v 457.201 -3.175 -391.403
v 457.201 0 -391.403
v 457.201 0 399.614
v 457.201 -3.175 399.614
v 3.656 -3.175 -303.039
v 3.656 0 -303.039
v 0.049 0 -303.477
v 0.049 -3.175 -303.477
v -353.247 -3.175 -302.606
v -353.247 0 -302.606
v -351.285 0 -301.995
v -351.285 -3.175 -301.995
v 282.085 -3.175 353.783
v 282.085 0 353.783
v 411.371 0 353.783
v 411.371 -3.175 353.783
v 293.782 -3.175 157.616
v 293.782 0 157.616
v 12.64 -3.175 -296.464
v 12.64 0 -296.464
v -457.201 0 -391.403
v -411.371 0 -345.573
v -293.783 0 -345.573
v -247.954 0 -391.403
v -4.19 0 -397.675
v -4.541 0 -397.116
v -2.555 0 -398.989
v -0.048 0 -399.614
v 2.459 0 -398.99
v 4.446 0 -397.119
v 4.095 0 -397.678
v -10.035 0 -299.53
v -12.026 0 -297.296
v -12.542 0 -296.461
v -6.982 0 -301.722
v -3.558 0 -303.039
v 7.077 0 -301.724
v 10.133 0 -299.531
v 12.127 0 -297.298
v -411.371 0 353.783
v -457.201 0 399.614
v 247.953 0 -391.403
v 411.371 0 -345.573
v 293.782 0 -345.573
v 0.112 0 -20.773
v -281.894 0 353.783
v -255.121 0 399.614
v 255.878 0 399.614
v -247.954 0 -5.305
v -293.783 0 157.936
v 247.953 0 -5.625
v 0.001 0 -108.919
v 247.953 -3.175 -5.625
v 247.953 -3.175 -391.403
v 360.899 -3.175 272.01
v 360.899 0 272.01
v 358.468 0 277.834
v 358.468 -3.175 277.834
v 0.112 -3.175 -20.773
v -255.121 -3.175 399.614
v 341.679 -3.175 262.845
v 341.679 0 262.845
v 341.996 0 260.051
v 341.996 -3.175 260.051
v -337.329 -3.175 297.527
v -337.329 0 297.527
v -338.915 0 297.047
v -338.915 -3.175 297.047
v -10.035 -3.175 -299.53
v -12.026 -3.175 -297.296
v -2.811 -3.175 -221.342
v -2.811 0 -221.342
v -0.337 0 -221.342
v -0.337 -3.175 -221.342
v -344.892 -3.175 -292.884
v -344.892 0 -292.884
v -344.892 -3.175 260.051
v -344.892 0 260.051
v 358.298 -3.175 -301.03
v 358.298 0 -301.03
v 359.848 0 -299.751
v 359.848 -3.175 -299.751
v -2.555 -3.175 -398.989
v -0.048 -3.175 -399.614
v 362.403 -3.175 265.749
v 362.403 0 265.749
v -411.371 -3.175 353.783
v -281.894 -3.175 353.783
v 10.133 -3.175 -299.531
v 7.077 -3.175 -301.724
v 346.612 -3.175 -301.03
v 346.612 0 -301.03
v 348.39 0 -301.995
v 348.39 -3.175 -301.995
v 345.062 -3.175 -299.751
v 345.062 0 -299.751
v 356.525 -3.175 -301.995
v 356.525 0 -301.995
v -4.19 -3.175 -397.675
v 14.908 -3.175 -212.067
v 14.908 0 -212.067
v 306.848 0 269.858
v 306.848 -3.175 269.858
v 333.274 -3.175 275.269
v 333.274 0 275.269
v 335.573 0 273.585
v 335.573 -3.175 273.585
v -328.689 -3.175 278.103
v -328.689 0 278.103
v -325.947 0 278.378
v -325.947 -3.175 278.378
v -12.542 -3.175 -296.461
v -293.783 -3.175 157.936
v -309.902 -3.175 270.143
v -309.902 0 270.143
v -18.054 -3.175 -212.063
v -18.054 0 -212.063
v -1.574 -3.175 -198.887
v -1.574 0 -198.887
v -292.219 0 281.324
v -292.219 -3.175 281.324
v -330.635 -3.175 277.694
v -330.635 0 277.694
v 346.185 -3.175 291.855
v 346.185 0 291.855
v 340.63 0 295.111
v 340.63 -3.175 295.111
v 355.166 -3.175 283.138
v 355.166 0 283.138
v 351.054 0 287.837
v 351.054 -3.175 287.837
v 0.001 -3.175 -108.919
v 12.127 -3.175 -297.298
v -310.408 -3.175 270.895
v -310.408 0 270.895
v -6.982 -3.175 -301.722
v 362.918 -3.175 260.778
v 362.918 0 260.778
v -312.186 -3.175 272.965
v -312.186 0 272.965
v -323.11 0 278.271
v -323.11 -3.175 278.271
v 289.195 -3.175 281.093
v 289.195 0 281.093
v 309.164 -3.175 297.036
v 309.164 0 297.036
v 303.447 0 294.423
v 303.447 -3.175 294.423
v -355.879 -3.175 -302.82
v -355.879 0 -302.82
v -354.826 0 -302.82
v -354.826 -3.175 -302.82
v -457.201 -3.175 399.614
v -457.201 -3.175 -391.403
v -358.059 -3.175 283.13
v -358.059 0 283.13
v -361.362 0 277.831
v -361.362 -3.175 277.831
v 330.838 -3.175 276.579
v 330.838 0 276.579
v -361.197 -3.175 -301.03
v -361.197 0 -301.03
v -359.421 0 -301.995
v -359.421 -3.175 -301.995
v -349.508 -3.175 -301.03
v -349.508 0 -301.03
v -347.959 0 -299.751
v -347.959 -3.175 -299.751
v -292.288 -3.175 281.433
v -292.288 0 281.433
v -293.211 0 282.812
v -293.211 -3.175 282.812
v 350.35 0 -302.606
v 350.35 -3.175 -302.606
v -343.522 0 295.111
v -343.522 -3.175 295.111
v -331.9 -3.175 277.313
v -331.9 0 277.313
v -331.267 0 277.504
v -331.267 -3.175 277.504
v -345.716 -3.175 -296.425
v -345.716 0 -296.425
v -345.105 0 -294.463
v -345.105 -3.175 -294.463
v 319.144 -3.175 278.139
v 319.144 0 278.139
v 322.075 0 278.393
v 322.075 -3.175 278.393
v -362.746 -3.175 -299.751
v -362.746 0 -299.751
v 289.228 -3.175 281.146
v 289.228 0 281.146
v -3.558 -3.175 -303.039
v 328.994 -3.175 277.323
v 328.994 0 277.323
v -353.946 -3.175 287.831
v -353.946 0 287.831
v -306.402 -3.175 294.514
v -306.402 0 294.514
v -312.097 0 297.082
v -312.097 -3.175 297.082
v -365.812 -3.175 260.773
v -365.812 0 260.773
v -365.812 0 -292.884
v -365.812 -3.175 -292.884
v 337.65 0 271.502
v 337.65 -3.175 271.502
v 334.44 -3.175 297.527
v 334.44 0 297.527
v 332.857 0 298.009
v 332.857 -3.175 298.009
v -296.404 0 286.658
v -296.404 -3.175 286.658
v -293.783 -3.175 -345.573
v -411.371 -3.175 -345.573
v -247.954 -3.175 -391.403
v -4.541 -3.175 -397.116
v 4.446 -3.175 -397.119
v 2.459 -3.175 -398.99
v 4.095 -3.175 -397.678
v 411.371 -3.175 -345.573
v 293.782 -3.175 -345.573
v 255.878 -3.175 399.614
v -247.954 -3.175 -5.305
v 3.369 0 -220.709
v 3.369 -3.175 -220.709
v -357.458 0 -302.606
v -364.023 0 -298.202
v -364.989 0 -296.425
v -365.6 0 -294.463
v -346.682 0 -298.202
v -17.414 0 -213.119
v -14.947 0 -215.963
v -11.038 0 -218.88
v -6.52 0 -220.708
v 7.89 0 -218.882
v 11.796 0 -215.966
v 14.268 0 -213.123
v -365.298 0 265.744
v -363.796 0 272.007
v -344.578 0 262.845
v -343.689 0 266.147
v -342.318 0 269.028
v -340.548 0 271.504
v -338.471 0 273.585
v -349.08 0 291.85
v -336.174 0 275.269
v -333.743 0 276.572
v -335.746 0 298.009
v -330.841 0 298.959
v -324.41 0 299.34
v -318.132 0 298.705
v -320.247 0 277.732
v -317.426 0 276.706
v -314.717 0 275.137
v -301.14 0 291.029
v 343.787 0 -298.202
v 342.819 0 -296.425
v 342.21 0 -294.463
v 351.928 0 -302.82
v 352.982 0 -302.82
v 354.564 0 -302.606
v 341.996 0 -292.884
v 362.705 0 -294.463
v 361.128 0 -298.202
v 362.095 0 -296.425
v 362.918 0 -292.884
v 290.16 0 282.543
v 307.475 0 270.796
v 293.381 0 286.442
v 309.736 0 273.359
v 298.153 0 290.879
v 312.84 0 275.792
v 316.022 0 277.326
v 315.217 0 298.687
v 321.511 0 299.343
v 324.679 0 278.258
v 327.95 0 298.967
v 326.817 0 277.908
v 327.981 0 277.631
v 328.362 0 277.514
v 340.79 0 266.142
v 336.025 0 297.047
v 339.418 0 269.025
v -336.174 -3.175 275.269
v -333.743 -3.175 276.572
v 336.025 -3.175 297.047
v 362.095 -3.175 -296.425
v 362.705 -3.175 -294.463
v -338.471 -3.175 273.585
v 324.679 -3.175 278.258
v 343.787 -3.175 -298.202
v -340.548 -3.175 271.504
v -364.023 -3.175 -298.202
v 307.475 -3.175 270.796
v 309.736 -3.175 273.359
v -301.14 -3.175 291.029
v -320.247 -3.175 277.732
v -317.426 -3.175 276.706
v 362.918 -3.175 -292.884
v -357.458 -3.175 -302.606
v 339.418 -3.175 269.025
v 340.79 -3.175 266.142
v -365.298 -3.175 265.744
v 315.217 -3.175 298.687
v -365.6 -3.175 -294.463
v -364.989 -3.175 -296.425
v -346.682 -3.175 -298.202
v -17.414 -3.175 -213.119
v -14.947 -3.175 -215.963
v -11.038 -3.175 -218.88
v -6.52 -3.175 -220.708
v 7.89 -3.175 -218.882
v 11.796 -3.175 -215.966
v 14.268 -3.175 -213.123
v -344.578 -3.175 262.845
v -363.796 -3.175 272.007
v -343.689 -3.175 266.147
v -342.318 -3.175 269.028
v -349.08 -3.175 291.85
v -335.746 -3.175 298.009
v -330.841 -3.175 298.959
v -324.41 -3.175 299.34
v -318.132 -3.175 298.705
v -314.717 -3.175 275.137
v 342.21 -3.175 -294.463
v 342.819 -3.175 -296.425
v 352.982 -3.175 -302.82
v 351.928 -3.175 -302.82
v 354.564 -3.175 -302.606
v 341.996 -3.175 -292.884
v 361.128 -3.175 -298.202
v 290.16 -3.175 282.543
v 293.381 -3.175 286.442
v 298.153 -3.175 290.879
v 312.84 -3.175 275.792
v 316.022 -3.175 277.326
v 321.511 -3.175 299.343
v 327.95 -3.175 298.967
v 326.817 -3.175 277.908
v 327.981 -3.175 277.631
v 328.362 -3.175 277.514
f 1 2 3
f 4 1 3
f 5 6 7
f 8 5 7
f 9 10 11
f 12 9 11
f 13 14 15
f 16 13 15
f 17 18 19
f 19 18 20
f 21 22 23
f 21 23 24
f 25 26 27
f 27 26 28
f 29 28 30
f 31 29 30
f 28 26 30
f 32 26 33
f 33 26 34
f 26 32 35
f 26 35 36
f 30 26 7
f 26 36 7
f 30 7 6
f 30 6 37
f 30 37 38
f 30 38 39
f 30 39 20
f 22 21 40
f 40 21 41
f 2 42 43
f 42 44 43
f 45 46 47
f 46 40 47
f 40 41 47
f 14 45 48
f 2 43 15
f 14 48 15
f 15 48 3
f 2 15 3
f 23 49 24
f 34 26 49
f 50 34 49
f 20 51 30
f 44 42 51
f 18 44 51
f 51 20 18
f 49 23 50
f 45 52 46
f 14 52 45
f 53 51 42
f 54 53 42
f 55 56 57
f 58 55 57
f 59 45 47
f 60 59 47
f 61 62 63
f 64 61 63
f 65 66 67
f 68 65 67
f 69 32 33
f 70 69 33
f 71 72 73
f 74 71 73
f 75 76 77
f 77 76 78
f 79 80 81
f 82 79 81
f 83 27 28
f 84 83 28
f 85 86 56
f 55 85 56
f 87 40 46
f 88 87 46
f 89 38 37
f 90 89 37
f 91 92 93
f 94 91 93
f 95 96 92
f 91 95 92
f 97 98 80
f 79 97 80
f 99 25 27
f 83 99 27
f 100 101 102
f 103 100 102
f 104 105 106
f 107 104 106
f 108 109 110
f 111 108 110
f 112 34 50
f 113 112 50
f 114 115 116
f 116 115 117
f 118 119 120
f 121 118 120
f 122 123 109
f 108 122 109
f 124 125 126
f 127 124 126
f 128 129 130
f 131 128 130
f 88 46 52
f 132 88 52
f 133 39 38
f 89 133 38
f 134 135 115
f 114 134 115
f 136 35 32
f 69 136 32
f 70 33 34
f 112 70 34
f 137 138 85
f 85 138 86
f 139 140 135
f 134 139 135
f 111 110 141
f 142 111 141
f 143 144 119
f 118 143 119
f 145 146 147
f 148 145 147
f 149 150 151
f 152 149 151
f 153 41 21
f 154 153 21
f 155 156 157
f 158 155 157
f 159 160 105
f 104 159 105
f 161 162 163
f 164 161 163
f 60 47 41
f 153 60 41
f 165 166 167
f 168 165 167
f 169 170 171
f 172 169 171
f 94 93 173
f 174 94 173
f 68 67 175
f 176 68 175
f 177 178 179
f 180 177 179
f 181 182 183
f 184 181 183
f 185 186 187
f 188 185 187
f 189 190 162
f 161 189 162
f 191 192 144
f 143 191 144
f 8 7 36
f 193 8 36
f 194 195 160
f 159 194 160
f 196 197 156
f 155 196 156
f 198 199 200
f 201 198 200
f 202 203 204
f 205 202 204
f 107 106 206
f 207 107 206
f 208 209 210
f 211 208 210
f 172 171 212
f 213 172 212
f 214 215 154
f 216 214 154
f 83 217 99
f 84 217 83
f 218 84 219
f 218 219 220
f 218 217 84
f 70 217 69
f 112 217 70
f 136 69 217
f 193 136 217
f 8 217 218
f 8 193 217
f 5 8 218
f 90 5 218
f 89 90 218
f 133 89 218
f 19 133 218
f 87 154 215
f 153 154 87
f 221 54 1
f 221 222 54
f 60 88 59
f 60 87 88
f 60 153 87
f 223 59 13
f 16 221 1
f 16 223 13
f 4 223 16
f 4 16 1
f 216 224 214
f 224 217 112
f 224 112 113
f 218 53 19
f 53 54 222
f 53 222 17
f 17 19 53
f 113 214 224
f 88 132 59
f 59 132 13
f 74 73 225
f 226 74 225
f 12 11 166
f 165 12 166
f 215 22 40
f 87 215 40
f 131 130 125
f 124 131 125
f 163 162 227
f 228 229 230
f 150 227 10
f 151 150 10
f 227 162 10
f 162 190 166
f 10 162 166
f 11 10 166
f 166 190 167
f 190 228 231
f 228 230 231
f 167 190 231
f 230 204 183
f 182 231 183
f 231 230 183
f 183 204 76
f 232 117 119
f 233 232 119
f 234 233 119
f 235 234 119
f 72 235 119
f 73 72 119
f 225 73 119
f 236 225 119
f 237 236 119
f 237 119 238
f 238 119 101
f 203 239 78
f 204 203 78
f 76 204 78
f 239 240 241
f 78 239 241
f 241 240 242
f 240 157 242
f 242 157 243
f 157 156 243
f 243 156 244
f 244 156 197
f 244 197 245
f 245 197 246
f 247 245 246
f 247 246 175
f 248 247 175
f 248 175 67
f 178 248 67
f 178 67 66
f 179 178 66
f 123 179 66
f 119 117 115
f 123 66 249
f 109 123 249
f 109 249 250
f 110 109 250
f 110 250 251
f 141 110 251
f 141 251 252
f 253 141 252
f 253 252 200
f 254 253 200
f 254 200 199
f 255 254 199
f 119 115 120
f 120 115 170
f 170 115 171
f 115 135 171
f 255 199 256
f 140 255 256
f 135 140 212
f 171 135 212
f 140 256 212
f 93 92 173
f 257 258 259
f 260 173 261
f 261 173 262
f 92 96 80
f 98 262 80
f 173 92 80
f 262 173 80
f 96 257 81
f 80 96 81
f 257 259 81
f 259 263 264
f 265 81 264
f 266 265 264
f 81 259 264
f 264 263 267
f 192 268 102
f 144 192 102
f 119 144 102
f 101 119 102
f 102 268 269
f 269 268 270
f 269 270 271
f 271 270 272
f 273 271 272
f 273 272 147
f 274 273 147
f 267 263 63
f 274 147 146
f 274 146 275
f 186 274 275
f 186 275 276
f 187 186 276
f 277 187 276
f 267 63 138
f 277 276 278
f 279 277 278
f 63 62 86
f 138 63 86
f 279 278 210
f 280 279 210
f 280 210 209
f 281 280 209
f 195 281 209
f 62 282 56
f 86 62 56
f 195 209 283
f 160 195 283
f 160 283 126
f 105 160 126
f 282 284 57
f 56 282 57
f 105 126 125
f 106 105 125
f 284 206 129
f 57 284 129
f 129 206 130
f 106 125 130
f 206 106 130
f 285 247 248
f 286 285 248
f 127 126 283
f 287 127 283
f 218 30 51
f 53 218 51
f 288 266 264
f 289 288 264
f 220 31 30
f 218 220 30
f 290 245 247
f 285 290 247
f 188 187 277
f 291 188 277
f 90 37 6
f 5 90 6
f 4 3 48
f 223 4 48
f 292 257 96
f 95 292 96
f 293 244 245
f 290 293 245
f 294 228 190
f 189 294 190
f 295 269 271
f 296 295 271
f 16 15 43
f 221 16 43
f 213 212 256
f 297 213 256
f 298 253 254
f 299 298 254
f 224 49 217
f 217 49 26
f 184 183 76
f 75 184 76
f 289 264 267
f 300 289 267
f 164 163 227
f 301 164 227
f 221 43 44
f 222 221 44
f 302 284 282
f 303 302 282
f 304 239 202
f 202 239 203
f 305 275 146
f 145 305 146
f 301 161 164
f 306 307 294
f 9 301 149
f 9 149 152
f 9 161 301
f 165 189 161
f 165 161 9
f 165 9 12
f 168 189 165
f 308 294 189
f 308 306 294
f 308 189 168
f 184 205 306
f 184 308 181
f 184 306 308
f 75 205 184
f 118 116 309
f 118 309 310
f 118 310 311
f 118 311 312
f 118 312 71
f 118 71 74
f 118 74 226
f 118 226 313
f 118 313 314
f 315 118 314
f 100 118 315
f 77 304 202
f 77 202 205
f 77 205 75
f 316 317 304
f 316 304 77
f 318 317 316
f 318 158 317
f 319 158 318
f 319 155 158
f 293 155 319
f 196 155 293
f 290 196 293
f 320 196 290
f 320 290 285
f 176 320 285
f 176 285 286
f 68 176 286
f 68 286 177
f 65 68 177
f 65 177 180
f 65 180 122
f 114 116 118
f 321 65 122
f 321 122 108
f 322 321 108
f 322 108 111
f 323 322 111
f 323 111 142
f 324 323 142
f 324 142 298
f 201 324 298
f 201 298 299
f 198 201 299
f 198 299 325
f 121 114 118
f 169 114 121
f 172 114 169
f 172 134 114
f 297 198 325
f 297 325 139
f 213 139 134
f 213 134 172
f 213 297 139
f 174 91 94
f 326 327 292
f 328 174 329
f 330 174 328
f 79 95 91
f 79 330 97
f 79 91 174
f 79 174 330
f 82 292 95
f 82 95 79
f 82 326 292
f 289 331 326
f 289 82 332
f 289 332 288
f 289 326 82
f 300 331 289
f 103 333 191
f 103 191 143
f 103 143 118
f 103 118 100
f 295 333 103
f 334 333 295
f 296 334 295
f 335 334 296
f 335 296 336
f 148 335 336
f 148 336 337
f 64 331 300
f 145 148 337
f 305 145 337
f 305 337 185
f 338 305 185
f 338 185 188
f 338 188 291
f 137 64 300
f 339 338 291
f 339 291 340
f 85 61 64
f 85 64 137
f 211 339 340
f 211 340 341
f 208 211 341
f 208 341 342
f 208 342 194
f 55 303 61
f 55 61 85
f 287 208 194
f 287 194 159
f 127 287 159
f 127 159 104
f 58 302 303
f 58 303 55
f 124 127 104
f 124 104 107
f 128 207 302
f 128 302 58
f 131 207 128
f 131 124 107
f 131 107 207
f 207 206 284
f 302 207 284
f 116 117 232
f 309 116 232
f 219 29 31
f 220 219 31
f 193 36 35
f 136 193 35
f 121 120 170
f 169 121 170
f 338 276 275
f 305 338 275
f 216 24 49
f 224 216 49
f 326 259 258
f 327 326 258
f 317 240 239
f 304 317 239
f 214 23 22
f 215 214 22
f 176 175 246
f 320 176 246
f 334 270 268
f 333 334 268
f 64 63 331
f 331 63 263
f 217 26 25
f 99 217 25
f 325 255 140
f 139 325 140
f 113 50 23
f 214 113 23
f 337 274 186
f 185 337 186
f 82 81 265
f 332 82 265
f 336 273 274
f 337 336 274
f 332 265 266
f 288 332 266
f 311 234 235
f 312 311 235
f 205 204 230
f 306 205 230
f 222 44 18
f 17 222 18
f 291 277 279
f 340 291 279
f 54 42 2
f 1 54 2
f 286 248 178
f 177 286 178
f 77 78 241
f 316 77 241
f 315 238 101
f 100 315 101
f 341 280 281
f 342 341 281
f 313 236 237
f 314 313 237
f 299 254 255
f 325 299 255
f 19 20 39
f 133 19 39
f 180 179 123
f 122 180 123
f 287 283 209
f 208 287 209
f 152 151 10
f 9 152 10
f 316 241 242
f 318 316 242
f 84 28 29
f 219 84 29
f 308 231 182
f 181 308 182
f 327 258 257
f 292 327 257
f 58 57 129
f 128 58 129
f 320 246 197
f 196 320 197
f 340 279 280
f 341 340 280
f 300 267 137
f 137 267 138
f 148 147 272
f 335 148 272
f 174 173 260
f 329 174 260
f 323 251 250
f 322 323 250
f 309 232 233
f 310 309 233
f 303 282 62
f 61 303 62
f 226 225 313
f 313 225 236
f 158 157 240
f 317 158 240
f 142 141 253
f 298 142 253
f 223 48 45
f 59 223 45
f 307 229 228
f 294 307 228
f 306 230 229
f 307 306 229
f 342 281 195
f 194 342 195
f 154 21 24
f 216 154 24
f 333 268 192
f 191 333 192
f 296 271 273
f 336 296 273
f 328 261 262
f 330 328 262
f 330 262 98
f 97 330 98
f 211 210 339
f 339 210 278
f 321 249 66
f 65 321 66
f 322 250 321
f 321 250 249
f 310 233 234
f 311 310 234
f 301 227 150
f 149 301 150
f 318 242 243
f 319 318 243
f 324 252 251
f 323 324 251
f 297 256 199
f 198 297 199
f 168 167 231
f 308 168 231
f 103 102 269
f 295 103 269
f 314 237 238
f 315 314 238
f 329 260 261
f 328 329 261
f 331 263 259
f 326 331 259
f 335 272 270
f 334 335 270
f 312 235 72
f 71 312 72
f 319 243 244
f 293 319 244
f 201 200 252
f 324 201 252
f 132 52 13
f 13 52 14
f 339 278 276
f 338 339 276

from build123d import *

# Parameters (mm, degrees)
F1_DEPTH = 3.175


with BuildPart() as f1:
    # F0 (on Front) → F1 (new body)
    with BuildSketch(Plane.XZ):
        Polygon((247.952895, -391.40257), (457.200635, -391.40257), (457.200635, 399.614314), (255.877695, 399.614314), (0.112395, -20.773466), (-255.121029, 399.614314), (-457.200635, 399.614314), (-457.200635, -391.40257), (-247.953657, -391.40257), (-247.953657, -5.304866), (-4.540885, -397.115919), (-4.190365, -397.675379), (-2.554605, -398.988686), (-0.047625, -399.614288), (2.459355, -398.990058), (4.095115, -397.678148), (4.445635, -397.118662), (247.952895, -5.624906), align=None)
        Polygon((411.371415, -345.573172), (293.782115, -345.573172), (293.782115, 157.615814), (12.639675, -296.46405), (12.126595, -297.297678), (10.132695, -299.531354), (7.077075, -301.723882), (3.655695, -303.038586), (0.048895, -303.476736), (-3.557905, -303.038586), (-6.981825, -301.722358), (-10.034905, -299.530338), (-12.026265, -297.296408), (-12.541885, -296.461002), (-293.783385, 157.935854), (-293.783385, -345.573172), (-411.371161, -345.573172), (-411.371161, 353.782554), (-281.893645, 353.782554), (0.000635, -108.919086), (282.085415, 353.782554), (411.371415, 353.782554), align=None, mode=Mode.SUBTRACT)
        Polygon((336.024855, 297.046574), (334.439895, 297.526634), (332.857475, 298.009234), (327.950195, 298.966814), (321.511295, 299.342734), (315.217175, 298.687414), (309.164355, 297.036414), (303.446815, 294.422754), (298.153455, 290.879454), (293.380795, 286.442074), (290.160075, 282.543174), (289.227895, 281.146174), (289.194875, 281.092834), (-1.574165, -198.886648), (-292.218999, 281.323974), (-292.287833, 281.433194), (-293.211377, 282.812414), (-296.404157, 286.657974), (-301.140495, 291.029314), (-306.401851, 294.514194), (-312.097293, 297.082134), (-318.131571, 298.705194), (-324.409943, 299.340194), (-330.841477, 298.959194), (-335.745963, 298.009234), (-337.329145, 297.526634), (-338.915121, 297.046574), (-343.522173, 295.111094), (-349.079693, 291.849734), (-353.945571, 287.831454), (-358.059101, 283.129914), (-361.362117, 277.831474), (-363.795945, 272.007254), (-365.297847, 265.743614), (-365.811689, 260.772834), (-365.811689, 259.119294), (-365.811689, -292.358648), (-365.811689, -292.88392), (-365.599599, -294.463038), (-364.988983, -296.425442), (-364.023021, -298.201664), (-362.745655, -299.75081), (-361.196763, -301.0297), (-359.420541, -301.995408), (-357.458391, -302.60577), (-355.879019, -302.819638), (-355.351207, -302.819638), (-354.826189, -302.819638), (-353.246817, -302.60577), (-351.284667, -301.995408), (-349.508445, -301.0297), (-347.959299, -299.75081), (-346.681933, -298.201664), (-345.715971, -296.425442), (-345.105355, -294.463038), (-344.891995, -292.88392), (-344.891995, -292.358648), (-344.891995, 259.119294), (-344.891995, 260.051474), (-344.577543, 262.845474), (-343.688797, 266.147474), (-342.317705, 269.027834), (-340.548341, 271.504334), (-338.471383, 273.584594), (-336.174461, 275.268614), (-333.743427, 276.571634), (-331.899895, 277.313314), (-331.267435, 277.503814), (-330.634721, 277.694314), (-328.688827, 278.103254), (-325.946643, 278.377574), (-323.110479, 278.270894), (-320.246883, 277.732414), (-317.426213, 276.706254), (-314.716795, 275.136534), (-312.185685, 272.964834), (-310.407939, 270.894734), (-309.901971, 270.142894), (-18.053685, -212.063152), (-17.413605, -213.118776), (-14.947265, -215.963322), (-11.038205, -218.880258), (-6.519545, -220.707788), (-2.811145, -221.341772), (-1.574165, -221.341772), (-0.337185, -221.341772), (3.368675, -220.709058), (7.889875, -218.881782), (11.796395, -215.966116), (14.267815, -213.123094), (14.907895, -212.06747), (306.847875, 269.858414), (307.475255, 270.795674), (309.735855, 273.358534), (312.839735, 275.791854), (316.022355, 277.326014), (319.144015, 278.138814), (322.075175, 278.392814), (324.678675, 278.258194), (326.817355, 277.907674), (327.980675, 277.630814), (328.361675, 277.513974), (328.994135, 277.323474), (330.838175, 276.579254), (333.274035, 275.268614), (335.572735, 273.584594), (337.650455, 271.501794), (339.418295, 269.025294), (340.789895, 266.142394), (341.678895, 262.845474), (341.996395, 260.051474), (341.996395, 259.119294), (341.996395, -292.358648), (341.996395, -292.88392), (342.209755, -294.463038), (342.819355, -296.425442), (343.787095, -298.201664), (345.062175, -299.75081), (346.611575, -301.0297), (348.389575, -301.995408), (350.350455, -302.60577), (351.927795, -302.819638), (352.456115, -302.819638), (352.981895, -302.819638), (354.564315, -302.60577), (356.525195, -301.995408), (358.298115, -301.0297), (359.847515, -299.75081), (361.127675, -298.201664), (362.095415, -296.425442), (362.705015, -294.463038), (362.918375, -292.88392), (362.918375, -292.358648), (362.918375, 259.119294), (362.918375, 260.777914), (362.402755, 265.748694), (360.899075, 272.009794), (358.468295, 277.834014), (355.166295, 283.137534), (351.054035, 287.836534), (346.184855, 291.854814), (340.629875, 295.111094), align=None)
    extrude(amount=F1_DEPTH)


solid = f1.part
